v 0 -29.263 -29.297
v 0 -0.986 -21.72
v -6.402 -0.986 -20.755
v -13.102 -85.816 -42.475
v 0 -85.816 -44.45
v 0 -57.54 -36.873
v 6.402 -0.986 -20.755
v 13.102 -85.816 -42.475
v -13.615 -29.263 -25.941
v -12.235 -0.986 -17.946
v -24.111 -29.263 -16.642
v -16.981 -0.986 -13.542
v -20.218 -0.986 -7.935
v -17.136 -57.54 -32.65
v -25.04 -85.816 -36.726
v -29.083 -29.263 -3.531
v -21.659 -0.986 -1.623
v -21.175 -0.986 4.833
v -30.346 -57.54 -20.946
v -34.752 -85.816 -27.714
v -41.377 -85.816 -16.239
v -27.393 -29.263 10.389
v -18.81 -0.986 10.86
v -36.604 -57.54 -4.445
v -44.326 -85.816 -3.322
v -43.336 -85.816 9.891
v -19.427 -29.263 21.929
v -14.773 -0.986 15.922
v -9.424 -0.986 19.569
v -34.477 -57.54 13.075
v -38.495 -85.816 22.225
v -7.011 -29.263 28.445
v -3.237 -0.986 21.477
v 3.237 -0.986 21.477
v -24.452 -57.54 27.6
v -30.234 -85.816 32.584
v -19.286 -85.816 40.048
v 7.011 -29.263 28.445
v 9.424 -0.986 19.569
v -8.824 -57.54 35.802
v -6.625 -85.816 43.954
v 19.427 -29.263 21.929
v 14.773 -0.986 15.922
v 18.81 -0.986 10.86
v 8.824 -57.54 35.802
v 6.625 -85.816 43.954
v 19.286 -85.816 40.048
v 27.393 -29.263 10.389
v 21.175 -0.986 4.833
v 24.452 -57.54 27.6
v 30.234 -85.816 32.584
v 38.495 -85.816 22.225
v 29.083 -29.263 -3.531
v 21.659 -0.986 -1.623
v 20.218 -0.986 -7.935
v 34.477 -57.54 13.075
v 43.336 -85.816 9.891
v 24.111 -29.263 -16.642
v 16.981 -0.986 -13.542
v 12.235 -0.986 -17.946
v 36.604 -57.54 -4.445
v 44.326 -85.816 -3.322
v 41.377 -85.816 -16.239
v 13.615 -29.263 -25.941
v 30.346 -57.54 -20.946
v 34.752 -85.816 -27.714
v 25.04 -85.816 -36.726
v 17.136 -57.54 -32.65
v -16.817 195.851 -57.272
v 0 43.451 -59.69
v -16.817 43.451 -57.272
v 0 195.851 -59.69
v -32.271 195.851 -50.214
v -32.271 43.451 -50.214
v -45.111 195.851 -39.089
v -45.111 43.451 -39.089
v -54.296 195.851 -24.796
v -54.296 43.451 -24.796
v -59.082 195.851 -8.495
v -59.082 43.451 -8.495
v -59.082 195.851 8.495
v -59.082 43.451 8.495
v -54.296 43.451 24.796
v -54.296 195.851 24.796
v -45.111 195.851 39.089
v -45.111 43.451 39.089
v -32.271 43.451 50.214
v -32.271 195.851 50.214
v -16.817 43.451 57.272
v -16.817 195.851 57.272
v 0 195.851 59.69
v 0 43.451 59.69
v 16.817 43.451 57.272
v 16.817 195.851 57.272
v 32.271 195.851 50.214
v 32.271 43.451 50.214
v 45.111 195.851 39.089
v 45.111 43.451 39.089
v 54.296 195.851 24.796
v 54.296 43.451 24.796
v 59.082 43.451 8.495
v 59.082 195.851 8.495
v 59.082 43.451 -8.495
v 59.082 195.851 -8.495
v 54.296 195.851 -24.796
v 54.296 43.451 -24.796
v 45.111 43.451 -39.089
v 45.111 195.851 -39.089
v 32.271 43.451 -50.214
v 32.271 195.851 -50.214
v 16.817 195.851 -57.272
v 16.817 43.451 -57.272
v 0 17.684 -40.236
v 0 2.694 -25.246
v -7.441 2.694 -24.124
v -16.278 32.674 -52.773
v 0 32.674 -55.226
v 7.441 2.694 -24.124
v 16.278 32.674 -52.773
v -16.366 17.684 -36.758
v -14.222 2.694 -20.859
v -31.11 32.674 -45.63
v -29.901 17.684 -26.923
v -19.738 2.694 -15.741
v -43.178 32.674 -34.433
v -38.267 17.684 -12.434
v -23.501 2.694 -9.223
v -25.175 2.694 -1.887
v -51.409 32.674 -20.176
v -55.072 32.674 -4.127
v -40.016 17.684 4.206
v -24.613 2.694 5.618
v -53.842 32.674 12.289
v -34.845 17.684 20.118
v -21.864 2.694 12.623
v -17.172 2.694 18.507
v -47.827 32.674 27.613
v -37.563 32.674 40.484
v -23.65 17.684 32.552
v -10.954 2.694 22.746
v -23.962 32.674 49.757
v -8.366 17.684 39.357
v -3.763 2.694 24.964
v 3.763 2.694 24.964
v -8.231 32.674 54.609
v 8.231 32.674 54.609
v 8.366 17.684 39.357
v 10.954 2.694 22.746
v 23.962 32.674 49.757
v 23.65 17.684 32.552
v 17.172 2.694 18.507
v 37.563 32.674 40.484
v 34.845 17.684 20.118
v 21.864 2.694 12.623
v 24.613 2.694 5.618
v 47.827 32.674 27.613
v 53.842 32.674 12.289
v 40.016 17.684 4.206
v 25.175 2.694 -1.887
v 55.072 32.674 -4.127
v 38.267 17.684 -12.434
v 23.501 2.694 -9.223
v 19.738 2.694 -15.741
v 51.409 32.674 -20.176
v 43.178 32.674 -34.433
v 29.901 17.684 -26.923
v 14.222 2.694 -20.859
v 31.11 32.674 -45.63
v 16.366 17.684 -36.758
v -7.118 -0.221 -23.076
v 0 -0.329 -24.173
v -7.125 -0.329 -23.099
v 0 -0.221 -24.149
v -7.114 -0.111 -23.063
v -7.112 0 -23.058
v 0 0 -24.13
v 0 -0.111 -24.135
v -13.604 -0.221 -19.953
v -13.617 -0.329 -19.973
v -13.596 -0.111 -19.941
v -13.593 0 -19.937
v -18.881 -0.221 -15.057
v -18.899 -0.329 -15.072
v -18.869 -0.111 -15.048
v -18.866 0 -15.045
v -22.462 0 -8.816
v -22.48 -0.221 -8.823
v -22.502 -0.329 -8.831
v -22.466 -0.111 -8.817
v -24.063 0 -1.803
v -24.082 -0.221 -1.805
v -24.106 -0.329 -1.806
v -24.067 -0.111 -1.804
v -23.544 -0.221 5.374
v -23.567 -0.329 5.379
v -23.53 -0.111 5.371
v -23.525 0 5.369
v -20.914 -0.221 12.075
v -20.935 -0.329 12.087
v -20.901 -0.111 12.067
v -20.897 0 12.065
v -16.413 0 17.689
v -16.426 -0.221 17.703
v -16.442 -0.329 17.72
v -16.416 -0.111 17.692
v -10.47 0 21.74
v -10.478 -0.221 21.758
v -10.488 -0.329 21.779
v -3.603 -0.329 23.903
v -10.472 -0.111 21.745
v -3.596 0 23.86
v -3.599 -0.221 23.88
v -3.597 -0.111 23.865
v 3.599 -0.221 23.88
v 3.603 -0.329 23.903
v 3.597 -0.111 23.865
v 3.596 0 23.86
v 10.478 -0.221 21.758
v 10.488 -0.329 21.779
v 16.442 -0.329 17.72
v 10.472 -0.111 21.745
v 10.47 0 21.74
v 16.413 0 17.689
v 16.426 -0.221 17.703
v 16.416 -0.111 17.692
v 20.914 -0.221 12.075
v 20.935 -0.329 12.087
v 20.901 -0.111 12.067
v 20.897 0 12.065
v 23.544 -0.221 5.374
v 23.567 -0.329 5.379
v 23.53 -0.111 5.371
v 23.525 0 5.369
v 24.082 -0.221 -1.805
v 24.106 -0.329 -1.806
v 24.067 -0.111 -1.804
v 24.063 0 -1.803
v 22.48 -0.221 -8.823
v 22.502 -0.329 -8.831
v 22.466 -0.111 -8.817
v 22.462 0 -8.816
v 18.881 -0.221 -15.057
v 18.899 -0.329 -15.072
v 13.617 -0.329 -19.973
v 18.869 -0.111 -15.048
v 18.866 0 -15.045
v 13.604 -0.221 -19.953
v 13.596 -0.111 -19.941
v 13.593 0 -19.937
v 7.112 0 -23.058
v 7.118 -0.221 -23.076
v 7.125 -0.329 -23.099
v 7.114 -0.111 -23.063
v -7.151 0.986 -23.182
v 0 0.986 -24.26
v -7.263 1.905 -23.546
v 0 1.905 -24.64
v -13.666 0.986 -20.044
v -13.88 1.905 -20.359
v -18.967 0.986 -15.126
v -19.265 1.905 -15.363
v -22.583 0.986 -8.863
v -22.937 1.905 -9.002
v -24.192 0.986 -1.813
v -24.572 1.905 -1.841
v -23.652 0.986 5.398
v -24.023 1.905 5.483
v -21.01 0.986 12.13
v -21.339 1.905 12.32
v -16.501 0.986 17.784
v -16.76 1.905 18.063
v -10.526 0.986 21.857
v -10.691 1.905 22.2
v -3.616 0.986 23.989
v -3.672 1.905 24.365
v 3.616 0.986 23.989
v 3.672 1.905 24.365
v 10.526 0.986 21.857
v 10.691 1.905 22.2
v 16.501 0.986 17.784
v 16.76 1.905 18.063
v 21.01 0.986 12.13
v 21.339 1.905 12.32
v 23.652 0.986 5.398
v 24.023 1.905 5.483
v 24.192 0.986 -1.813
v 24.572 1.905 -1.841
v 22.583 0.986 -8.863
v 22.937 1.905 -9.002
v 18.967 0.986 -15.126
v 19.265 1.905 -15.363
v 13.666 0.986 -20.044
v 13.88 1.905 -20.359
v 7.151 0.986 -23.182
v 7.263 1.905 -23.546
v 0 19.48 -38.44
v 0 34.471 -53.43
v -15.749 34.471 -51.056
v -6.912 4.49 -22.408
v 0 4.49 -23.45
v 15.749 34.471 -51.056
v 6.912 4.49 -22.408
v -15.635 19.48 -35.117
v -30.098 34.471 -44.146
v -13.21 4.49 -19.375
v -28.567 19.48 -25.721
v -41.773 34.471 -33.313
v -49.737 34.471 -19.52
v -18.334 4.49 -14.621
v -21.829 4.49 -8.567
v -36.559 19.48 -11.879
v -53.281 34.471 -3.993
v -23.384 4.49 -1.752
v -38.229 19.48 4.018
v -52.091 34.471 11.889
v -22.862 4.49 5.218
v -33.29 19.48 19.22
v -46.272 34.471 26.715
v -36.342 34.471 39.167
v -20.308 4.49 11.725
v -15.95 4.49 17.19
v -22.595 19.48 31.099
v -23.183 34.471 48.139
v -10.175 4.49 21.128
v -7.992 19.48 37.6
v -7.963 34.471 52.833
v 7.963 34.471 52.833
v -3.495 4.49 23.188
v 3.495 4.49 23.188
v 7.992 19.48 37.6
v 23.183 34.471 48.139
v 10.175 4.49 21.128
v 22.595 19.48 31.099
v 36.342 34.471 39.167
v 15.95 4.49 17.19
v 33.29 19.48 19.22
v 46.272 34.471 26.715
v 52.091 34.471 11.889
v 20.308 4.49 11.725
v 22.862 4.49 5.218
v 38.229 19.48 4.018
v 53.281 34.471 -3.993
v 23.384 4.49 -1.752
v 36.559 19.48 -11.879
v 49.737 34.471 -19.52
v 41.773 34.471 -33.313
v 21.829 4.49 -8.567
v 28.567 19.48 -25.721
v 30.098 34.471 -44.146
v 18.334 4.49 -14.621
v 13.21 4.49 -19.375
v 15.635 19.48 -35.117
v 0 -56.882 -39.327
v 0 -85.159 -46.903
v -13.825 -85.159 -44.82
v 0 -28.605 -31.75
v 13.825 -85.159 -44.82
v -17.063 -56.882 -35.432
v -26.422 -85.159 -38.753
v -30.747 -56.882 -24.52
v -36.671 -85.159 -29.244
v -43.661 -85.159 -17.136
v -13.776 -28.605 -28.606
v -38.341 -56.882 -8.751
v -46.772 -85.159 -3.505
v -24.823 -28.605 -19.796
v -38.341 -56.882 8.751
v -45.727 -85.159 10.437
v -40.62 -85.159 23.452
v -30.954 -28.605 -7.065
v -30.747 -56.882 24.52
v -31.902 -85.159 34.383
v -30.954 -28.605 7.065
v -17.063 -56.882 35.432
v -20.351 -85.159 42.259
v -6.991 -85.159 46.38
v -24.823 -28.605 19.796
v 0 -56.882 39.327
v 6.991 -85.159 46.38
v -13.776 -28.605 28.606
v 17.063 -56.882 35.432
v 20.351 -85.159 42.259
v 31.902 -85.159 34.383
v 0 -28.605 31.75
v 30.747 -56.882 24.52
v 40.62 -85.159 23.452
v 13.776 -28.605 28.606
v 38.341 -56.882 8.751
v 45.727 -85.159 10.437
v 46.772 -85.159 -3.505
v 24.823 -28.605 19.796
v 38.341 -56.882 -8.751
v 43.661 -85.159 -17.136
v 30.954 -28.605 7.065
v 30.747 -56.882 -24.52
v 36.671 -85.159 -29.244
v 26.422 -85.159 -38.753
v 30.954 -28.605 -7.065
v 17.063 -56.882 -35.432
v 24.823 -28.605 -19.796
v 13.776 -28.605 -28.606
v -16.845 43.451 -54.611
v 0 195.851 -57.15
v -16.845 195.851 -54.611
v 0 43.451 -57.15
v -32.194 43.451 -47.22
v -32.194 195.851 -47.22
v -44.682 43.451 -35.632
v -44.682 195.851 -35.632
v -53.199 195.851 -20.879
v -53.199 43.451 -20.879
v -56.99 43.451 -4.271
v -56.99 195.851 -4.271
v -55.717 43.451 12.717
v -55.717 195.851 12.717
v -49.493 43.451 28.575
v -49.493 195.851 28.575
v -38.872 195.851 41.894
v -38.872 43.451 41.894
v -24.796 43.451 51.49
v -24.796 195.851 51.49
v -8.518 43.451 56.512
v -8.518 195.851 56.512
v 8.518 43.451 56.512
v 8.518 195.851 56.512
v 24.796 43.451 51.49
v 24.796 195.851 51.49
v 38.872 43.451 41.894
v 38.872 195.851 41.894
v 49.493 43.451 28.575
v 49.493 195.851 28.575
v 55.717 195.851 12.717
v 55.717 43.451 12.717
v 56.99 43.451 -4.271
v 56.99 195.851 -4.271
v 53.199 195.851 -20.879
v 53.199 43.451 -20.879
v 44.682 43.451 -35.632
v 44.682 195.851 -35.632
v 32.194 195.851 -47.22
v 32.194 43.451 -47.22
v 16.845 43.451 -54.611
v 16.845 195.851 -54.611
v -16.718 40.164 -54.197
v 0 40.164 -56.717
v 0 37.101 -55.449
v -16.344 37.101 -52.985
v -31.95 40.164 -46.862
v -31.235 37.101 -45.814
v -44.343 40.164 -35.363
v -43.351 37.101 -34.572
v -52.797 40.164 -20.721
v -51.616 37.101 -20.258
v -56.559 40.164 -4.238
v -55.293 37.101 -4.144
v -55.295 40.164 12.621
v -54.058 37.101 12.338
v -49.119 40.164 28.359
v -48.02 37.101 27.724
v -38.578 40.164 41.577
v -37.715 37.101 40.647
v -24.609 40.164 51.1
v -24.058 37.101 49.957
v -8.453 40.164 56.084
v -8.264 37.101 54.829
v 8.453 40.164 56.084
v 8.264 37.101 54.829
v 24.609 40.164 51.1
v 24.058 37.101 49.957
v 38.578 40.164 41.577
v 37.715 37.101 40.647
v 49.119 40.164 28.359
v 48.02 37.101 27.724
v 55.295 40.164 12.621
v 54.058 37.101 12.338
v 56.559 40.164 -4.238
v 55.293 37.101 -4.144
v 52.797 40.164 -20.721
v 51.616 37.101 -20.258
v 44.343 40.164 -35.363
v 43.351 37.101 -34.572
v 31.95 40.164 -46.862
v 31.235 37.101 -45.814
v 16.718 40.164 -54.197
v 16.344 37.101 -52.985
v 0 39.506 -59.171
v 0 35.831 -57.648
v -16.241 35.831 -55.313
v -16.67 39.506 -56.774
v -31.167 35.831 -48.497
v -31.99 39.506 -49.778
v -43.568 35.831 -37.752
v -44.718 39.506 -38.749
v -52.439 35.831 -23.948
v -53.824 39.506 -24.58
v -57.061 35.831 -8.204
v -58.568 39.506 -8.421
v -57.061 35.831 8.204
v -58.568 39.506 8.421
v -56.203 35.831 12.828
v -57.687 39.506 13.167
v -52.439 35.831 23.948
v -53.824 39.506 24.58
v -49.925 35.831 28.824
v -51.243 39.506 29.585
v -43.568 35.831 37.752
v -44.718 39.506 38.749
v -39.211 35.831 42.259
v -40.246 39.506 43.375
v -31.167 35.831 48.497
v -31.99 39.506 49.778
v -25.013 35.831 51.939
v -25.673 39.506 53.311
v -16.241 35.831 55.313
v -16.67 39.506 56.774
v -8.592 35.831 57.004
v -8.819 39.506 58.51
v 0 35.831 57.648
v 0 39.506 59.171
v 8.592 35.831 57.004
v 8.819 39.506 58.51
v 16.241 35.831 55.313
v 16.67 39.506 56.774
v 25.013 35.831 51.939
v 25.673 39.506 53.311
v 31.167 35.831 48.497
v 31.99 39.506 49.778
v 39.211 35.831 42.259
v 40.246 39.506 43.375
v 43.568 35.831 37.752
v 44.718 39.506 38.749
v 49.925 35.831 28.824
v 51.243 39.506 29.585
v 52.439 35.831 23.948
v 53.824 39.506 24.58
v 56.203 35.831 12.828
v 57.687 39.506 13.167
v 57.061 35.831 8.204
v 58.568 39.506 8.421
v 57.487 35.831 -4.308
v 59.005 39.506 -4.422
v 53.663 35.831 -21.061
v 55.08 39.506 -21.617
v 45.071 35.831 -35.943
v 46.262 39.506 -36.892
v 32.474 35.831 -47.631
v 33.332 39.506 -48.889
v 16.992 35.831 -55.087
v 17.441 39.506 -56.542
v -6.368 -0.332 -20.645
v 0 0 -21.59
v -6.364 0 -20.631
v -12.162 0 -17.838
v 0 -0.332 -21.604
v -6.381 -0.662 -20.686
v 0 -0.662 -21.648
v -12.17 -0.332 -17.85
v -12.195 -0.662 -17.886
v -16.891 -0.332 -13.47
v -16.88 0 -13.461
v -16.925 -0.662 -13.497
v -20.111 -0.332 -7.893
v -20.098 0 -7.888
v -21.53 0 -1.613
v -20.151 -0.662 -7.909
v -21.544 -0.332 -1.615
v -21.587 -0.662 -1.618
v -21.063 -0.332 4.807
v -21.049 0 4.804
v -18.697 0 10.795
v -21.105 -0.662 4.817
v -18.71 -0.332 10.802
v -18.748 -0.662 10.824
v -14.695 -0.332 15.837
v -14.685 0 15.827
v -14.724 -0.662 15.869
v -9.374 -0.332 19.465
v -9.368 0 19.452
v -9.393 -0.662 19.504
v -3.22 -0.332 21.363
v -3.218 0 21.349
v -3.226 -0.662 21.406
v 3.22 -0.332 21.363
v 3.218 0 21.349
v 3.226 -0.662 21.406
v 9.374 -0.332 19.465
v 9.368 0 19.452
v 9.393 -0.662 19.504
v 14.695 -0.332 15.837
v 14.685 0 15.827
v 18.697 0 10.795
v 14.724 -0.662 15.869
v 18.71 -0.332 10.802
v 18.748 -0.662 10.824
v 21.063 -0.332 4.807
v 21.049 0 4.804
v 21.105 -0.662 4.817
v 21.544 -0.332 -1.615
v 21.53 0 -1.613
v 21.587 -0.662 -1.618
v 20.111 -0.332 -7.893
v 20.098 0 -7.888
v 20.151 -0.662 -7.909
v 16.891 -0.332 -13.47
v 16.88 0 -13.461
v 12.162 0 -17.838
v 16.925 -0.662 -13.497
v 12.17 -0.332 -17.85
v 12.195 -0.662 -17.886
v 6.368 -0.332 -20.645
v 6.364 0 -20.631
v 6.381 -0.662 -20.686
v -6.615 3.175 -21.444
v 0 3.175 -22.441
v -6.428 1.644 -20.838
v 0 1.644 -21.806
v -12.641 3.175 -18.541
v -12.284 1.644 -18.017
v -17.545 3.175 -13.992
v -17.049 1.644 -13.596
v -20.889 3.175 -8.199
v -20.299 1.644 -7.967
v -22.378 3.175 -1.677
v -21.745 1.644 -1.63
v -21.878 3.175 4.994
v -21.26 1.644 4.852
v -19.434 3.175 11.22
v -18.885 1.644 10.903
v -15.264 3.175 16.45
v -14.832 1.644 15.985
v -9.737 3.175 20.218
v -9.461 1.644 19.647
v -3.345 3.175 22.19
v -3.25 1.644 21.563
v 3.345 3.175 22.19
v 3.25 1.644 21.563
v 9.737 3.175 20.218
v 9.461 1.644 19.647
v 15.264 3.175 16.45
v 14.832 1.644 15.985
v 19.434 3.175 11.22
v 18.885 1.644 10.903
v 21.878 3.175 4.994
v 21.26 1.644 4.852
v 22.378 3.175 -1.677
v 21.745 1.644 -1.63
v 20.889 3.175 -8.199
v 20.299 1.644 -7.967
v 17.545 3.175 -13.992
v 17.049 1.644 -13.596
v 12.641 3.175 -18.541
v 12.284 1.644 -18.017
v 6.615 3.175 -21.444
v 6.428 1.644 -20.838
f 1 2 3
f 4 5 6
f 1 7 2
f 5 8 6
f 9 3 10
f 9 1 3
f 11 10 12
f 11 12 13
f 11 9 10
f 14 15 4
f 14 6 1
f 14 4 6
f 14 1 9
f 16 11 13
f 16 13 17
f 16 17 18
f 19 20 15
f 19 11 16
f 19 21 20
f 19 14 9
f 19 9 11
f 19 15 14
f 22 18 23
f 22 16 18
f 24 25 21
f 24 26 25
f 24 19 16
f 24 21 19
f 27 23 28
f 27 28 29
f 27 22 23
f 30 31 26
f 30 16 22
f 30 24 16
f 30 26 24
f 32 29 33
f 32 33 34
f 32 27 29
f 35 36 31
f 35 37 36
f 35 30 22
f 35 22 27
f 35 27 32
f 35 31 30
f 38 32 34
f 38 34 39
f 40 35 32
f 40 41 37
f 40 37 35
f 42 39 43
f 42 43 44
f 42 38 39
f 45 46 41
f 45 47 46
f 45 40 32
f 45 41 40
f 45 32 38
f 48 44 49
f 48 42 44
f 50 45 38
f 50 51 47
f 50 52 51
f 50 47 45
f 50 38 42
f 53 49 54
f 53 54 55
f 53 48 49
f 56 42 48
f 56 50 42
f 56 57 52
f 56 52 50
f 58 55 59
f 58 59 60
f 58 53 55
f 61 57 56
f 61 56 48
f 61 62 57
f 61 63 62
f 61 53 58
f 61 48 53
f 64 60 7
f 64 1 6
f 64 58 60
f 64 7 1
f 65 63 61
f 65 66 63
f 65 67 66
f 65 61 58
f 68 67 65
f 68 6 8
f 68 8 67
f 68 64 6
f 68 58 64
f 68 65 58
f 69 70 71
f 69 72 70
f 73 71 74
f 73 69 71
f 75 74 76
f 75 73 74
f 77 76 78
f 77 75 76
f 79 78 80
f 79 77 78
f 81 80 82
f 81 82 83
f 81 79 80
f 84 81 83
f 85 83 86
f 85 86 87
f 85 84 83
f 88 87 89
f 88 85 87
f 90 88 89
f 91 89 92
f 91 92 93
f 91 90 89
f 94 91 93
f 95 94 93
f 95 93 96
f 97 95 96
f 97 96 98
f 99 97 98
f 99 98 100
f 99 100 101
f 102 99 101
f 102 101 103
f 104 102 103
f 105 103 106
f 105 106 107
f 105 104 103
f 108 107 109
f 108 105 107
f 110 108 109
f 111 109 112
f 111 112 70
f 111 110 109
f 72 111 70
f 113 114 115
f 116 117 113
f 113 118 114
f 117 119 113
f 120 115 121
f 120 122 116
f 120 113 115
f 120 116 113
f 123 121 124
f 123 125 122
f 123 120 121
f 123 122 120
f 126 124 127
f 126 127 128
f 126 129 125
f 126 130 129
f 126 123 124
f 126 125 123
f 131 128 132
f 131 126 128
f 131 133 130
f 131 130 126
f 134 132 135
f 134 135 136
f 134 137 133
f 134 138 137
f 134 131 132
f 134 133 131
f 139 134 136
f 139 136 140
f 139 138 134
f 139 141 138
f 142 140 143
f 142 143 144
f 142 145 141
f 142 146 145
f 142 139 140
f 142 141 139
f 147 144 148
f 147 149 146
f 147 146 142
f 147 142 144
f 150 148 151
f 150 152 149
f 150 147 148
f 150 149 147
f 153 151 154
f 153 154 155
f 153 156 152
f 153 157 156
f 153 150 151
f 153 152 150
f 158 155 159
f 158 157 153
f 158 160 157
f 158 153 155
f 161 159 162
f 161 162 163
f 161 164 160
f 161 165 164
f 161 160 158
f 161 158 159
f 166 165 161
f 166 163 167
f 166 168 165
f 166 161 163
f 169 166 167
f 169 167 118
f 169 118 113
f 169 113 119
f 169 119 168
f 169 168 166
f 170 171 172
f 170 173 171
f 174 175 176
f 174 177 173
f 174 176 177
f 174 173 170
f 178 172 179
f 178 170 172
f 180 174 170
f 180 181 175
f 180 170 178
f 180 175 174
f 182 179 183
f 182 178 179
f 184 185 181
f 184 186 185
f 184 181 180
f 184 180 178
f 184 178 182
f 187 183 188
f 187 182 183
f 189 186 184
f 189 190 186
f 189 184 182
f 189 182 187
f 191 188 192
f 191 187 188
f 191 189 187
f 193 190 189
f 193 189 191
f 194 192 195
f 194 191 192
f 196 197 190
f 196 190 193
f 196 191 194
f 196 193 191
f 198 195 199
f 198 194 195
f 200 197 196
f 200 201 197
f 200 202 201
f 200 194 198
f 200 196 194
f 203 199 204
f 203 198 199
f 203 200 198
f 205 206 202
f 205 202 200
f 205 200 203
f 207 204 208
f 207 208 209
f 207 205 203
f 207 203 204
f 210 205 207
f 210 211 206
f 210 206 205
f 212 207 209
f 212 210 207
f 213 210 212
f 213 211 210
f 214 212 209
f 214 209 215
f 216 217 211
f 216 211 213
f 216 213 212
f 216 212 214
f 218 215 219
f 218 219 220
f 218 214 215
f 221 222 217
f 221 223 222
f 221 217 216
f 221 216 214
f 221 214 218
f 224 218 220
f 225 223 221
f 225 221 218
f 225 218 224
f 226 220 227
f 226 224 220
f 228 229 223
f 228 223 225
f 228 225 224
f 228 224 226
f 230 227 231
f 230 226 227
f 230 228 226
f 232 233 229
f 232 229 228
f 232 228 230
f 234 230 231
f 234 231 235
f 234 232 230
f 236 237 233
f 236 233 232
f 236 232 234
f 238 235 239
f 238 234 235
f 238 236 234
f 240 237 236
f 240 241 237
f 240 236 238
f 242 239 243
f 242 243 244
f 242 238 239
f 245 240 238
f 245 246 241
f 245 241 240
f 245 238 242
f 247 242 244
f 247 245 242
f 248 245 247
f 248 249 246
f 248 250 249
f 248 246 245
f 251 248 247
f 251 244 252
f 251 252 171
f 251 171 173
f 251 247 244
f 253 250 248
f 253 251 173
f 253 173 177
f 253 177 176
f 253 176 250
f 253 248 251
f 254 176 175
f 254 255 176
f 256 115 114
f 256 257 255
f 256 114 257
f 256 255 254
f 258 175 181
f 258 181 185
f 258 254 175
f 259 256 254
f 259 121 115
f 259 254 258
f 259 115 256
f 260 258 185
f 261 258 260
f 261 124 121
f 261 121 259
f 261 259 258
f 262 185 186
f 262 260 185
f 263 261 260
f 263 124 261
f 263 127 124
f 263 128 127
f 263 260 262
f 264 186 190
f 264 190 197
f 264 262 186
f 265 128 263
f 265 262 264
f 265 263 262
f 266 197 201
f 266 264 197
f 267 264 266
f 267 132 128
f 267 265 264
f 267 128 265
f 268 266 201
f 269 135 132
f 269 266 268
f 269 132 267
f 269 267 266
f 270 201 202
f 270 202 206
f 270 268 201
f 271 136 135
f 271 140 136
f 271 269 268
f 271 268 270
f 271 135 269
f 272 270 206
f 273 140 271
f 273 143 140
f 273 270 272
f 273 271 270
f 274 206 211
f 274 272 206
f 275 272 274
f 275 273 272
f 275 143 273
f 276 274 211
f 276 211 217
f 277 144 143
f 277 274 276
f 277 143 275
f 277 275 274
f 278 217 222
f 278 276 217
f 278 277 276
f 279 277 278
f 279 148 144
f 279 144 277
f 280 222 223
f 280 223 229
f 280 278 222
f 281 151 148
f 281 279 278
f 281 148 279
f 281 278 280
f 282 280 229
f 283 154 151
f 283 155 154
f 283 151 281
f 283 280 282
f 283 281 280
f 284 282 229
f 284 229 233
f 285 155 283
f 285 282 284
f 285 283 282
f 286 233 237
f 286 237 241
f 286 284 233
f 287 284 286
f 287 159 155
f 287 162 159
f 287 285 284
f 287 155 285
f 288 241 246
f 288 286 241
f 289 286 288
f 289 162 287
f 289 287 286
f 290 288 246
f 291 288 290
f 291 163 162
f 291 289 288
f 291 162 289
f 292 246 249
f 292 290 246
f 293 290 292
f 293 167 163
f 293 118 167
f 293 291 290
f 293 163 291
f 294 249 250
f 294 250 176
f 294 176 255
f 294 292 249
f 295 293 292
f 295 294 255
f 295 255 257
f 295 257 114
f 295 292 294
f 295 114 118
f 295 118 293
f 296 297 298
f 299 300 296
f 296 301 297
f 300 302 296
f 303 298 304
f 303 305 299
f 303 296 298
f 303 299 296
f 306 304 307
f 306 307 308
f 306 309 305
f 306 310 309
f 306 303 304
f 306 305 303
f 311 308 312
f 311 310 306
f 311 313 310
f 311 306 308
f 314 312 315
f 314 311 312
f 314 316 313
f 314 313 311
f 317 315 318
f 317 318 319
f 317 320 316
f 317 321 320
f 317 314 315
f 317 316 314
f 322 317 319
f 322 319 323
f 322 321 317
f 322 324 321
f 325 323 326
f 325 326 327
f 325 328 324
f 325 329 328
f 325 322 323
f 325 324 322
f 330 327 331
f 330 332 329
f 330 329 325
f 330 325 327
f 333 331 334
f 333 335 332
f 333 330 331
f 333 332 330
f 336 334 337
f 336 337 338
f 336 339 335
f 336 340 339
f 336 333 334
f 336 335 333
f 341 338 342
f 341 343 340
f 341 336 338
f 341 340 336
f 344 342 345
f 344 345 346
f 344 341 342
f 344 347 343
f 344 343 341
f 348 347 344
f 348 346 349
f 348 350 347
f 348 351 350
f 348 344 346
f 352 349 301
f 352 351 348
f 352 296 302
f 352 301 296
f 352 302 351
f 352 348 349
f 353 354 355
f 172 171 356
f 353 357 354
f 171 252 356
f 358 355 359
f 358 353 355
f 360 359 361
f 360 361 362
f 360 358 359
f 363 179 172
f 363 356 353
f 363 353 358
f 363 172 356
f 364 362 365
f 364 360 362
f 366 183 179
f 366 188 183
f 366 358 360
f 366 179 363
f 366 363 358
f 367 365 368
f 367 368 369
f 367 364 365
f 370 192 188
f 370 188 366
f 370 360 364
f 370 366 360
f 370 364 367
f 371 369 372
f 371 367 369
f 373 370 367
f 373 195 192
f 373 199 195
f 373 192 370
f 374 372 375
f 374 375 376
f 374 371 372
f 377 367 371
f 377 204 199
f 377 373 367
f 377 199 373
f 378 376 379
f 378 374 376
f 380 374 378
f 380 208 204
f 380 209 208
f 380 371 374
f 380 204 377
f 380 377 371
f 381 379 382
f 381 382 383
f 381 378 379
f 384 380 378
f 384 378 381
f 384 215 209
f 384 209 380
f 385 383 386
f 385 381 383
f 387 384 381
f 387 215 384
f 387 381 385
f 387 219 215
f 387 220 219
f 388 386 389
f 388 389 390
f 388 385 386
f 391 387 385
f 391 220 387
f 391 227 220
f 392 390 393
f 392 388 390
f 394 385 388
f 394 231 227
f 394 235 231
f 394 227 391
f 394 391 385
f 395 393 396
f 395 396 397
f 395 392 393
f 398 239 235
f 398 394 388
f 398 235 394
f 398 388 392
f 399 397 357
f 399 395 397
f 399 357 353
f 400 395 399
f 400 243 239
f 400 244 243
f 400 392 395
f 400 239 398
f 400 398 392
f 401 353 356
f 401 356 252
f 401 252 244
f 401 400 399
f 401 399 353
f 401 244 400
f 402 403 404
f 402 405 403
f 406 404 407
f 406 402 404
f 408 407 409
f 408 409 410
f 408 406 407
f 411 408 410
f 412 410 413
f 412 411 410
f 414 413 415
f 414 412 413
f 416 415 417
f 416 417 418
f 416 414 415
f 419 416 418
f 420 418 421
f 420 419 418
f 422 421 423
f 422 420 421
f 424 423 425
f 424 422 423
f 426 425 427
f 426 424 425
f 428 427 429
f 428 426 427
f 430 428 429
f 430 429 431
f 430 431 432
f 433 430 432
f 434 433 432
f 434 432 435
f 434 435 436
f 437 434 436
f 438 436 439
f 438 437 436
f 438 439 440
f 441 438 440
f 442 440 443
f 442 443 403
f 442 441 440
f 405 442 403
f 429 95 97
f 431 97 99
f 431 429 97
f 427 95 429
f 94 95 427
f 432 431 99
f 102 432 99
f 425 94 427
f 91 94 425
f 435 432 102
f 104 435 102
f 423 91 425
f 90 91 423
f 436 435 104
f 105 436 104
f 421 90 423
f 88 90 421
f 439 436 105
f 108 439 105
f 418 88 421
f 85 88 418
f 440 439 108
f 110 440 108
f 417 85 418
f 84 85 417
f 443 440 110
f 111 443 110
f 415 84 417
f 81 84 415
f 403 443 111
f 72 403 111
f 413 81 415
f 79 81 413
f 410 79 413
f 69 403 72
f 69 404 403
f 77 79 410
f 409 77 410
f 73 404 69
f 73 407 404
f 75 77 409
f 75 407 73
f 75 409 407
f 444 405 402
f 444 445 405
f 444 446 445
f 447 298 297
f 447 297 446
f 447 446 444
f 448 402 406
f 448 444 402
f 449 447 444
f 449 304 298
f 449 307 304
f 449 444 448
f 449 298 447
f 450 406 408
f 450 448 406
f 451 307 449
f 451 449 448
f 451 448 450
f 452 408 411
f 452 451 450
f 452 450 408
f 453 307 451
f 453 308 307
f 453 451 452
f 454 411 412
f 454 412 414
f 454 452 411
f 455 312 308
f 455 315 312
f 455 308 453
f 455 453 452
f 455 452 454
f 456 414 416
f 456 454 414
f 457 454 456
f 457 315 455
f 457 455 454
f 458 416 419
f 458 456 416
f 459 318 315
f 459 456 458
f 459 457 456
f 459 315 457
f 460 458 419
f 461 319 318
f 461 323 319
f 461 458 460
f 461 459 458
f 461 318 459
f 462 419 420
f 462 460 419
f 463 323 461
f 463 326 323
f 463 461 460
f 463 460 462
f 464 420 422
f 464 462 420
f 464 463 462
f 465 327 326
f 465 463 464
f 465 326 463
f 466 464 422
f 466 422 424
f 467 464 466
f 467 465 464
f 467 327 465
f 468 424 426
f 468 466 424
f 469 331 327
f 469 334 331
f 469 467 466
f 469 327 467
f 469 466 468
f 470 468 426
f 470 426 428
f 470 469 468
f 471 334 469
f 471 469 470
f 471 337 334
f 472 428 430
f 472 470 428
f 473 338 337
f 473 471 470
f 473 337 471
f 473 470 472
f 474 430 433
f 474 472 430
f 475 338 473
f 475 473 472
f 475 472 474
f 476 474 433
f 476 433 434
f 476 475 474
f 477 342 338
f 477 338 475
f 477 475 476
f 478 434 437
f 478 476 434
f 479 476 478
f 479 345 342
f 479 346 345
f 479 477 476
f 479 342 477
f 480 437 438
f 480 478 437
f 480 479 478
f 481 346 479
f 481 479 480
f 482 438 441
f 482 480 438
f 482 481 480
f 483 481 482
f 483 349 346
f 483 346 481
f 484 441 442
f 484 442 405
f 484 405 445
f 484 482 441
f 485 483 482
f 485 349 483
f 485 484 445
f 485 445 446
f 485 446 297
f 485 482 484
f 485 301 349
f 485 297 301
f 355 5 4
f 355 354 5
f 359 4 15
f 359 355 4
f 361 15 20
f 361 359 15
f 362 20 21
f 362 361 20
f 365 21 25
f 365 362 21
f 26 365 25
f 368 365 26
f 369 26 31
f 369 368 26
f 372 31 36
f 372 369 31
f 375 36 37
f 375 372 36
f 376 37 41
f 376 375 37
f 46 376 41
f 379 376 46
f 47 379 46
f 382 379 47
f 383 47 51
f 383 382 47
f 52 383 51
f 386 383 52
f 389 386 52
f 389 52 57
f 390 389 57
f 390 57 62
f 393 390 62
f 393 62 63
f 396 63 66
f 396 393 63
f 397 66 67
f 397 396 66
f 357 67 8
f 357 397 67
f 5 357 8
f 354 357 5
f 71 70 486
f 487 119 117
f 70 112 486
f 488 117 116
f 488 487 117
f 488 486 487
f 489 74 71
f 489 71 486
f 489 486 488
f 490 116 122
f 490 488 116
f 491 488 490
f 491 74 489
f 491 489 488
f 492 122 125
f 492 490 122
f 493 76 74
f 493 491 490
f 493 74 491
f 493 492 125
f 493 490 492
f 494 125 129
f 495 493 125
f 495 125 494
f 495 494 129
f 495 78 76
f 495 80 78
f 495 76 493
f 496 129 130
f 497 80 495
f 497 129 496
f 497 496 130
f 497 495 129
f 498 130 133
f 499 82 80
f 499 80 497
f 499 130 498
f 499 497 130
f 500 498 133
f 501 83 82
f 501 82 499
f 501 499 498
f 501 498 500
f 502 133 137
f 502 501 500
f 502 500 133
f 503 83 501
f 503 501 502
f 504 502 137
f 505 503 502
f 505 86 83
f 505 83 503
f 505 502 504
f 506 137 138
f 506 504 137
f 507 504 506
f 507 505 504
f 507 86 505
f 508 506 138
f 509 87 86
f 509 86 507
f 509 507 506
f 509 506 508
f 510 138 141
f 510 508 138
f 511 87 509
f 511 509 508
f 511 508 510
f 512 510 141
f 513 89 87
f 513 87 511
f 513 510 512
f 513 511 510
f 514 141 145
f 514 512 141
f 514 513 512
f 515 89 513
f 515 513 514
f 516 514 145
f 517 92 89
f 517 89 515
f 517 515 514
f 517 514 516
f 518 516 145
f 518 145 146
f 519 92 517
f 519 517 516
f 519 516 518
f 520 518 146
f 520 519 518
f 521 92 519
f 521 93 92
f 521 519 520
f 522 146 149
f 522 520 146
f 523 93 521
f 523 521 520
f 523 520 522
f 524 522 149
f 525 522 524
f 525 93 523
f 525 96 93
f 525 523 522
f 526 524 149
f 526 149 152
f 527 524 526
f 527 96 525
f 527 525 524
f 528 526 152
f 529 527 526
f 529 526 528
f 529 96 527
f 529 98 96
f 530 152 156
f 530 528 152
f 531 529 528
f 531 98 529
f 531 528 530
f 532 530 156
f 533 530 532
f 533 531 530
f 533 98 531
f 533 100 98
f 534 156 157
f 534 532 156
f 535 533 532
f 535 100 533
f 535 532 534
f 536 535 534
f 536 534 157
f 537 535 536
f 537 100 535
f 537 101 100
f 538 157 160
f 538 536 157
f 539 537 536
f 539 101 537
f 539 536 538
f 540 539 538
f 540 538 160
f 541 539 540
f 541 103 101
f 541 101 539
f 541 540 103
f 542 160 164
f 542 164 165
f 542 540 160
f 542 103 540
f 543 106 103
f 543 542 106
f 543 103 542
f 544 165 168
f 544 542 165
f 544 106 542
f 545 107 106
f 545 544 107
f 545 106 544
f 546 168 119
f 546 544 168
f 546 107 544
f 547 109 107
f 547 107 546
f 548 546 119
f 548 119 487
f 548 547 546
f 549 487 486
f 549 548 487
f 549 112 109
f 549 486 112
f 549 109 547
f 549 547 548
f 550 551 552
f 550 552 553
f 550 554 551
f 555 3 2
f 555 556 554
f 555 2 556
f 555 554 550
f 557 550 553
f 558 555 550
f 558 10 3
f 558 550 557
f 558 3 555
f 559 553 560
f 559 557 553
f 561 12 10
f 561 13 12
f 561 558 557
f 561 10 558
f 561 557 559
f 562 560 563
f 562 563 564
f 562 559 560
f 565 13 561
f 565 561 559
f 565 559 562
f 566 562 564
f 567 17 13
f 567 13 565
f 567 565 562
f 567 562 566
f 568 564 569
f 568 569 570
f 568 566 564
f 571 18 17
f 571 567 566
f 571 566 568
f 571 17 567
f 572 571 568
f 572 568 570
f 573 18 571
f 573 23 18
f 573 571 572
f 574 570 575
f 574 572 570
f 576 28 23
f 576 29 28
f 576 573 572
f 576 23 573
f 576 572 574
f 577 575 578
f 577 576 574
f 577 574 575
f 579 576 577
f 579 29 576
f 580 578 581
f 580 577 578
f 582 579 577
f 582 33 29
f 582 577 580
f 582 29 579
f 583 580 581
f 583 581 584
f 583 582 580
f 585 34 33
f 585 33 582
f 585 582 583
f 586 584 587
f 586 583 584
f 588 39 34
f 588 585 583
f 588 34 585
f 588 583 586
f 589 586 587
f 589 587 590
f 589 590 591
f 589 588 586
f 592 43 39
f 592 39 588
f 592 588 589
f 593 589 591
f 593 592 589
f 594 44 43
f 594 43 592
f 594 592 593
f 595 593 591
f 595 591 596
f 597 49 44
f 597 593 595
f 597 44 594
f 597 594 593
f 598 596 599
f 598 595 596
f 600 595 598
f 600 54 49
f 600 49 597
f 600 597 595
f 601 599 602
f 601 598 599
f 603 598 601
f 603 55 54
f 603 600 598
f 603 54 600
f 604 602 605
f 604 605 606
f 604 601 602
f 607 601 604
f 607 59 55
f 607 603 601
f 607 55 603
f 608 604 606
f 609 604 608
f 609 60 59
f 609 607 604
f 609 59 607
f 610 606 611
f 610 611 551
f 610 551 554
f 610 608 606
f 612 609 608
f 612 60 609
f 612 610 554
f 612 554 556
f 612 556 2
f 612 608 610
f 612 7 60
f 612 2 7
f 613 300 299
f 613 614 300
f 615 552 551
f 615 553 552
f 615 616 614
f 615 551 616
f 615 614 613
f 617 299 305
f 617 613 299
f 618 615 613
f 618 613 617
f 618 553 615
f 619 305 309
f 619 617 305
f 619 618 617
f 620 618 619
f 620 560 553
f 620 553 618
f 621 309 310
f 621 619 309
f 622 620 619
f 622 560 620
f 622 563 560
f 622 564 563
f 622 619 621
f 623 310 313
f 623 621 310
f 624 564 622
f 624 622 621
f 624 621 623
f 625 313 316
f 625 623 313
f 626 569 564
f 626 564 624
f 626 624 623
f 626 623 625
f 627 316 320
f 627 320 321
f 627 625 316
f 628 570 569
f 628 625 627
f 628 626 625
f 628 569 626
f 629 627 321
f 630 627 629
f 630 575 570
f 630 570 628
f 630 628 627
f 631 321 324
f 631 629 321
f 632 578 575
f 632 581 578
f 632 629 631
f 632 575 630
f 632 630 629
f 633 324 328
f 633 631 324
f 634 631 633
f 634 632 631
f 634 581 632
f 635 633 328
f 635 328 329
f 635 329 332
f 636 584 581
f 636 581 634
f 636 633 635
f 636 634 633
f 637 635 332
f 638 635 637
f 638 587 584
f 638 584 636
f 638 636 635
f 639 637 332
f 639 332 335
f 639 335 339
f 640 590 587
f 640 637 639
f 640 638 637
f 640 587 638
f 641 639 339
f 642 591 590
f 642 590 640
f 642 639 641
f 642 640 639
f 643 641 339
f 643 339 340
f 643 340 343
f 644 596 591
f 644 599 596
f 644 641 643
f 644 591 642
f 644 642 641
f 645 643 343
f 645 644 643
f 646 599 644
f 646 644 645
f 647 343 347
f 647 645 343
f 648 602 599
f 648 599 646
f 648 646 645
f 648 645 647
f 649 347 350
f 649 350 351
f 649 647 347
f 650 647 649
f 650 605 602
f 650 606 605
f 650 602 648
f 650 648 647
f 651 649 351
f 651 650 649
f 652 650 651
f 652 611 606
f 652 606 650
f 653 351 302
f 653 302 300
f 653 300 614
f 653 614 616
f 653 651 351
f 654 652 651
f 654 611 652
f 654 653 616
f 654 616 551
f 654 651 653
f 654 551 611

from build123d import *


with BuildPart() as part:
    # Sketch1 → Revolve-Thin1 (revolve)
    with BuildSketch(Plane.XY, mode=Mode.PRIVATE) as revolve_thin1_sk:
        with BuildLine():
            Line((-57.15, 195.850768363), (-57.15, 43.450768363))
            ThreePointArc((-57.15, 43.450768363), (-56.183270063, 38.590688772), (-53.430256121, 34.470512242))
            Line((-53.430256121, 34.470512242), (-23.449871939, 4.490128061))
            ThreePointArc((-23.449871939, 4.490128061), (-22.073364969, 2.430039796), (-21.59, 0))
            ThreePointArc((-21.59, 0), (-21.622595078, -0.497304792), (-21.719822602, -0.986100562))
            Line((-21.719822602, -0.986100562), (-44.45, -85.816277477))
            Line((-44.45, -85.816277477), (-46.903451599, -85.158877102))
            Line((-46.903451599, -85.158877102), (-24.173274201, -0.328700187))
            ThreePointArc((-24.173274201, -0.328700187), (-24.140865026, -0.165768264), (-24.13, 0))
            ThreePointArc((-24.13, 0), (-24.420018981, 1.458023877), (-25.245923164, 2.694076836))
            Line((-25.245923164, 2.694076836), (-55.226307345, 32.674461018))
            ThreePointArc((-55.226307345, 32.674461018), (-58.529924075, 37.618672854), (-59.69, 43.450768363))
            Line((-59.69, 43.450768363), (-59.69, 195.850768363))
            Line((-59.69, 195.850768363), (-57.15, 195.850768363))
        make_face()
    revolve(revolve_thin1_sk.sketch.rotate(Axis((0, 0, 0), (0, 1, 0)), 270), axis=Axis((0, 0, 0), (0, 1, 0)))


solid = part.part
